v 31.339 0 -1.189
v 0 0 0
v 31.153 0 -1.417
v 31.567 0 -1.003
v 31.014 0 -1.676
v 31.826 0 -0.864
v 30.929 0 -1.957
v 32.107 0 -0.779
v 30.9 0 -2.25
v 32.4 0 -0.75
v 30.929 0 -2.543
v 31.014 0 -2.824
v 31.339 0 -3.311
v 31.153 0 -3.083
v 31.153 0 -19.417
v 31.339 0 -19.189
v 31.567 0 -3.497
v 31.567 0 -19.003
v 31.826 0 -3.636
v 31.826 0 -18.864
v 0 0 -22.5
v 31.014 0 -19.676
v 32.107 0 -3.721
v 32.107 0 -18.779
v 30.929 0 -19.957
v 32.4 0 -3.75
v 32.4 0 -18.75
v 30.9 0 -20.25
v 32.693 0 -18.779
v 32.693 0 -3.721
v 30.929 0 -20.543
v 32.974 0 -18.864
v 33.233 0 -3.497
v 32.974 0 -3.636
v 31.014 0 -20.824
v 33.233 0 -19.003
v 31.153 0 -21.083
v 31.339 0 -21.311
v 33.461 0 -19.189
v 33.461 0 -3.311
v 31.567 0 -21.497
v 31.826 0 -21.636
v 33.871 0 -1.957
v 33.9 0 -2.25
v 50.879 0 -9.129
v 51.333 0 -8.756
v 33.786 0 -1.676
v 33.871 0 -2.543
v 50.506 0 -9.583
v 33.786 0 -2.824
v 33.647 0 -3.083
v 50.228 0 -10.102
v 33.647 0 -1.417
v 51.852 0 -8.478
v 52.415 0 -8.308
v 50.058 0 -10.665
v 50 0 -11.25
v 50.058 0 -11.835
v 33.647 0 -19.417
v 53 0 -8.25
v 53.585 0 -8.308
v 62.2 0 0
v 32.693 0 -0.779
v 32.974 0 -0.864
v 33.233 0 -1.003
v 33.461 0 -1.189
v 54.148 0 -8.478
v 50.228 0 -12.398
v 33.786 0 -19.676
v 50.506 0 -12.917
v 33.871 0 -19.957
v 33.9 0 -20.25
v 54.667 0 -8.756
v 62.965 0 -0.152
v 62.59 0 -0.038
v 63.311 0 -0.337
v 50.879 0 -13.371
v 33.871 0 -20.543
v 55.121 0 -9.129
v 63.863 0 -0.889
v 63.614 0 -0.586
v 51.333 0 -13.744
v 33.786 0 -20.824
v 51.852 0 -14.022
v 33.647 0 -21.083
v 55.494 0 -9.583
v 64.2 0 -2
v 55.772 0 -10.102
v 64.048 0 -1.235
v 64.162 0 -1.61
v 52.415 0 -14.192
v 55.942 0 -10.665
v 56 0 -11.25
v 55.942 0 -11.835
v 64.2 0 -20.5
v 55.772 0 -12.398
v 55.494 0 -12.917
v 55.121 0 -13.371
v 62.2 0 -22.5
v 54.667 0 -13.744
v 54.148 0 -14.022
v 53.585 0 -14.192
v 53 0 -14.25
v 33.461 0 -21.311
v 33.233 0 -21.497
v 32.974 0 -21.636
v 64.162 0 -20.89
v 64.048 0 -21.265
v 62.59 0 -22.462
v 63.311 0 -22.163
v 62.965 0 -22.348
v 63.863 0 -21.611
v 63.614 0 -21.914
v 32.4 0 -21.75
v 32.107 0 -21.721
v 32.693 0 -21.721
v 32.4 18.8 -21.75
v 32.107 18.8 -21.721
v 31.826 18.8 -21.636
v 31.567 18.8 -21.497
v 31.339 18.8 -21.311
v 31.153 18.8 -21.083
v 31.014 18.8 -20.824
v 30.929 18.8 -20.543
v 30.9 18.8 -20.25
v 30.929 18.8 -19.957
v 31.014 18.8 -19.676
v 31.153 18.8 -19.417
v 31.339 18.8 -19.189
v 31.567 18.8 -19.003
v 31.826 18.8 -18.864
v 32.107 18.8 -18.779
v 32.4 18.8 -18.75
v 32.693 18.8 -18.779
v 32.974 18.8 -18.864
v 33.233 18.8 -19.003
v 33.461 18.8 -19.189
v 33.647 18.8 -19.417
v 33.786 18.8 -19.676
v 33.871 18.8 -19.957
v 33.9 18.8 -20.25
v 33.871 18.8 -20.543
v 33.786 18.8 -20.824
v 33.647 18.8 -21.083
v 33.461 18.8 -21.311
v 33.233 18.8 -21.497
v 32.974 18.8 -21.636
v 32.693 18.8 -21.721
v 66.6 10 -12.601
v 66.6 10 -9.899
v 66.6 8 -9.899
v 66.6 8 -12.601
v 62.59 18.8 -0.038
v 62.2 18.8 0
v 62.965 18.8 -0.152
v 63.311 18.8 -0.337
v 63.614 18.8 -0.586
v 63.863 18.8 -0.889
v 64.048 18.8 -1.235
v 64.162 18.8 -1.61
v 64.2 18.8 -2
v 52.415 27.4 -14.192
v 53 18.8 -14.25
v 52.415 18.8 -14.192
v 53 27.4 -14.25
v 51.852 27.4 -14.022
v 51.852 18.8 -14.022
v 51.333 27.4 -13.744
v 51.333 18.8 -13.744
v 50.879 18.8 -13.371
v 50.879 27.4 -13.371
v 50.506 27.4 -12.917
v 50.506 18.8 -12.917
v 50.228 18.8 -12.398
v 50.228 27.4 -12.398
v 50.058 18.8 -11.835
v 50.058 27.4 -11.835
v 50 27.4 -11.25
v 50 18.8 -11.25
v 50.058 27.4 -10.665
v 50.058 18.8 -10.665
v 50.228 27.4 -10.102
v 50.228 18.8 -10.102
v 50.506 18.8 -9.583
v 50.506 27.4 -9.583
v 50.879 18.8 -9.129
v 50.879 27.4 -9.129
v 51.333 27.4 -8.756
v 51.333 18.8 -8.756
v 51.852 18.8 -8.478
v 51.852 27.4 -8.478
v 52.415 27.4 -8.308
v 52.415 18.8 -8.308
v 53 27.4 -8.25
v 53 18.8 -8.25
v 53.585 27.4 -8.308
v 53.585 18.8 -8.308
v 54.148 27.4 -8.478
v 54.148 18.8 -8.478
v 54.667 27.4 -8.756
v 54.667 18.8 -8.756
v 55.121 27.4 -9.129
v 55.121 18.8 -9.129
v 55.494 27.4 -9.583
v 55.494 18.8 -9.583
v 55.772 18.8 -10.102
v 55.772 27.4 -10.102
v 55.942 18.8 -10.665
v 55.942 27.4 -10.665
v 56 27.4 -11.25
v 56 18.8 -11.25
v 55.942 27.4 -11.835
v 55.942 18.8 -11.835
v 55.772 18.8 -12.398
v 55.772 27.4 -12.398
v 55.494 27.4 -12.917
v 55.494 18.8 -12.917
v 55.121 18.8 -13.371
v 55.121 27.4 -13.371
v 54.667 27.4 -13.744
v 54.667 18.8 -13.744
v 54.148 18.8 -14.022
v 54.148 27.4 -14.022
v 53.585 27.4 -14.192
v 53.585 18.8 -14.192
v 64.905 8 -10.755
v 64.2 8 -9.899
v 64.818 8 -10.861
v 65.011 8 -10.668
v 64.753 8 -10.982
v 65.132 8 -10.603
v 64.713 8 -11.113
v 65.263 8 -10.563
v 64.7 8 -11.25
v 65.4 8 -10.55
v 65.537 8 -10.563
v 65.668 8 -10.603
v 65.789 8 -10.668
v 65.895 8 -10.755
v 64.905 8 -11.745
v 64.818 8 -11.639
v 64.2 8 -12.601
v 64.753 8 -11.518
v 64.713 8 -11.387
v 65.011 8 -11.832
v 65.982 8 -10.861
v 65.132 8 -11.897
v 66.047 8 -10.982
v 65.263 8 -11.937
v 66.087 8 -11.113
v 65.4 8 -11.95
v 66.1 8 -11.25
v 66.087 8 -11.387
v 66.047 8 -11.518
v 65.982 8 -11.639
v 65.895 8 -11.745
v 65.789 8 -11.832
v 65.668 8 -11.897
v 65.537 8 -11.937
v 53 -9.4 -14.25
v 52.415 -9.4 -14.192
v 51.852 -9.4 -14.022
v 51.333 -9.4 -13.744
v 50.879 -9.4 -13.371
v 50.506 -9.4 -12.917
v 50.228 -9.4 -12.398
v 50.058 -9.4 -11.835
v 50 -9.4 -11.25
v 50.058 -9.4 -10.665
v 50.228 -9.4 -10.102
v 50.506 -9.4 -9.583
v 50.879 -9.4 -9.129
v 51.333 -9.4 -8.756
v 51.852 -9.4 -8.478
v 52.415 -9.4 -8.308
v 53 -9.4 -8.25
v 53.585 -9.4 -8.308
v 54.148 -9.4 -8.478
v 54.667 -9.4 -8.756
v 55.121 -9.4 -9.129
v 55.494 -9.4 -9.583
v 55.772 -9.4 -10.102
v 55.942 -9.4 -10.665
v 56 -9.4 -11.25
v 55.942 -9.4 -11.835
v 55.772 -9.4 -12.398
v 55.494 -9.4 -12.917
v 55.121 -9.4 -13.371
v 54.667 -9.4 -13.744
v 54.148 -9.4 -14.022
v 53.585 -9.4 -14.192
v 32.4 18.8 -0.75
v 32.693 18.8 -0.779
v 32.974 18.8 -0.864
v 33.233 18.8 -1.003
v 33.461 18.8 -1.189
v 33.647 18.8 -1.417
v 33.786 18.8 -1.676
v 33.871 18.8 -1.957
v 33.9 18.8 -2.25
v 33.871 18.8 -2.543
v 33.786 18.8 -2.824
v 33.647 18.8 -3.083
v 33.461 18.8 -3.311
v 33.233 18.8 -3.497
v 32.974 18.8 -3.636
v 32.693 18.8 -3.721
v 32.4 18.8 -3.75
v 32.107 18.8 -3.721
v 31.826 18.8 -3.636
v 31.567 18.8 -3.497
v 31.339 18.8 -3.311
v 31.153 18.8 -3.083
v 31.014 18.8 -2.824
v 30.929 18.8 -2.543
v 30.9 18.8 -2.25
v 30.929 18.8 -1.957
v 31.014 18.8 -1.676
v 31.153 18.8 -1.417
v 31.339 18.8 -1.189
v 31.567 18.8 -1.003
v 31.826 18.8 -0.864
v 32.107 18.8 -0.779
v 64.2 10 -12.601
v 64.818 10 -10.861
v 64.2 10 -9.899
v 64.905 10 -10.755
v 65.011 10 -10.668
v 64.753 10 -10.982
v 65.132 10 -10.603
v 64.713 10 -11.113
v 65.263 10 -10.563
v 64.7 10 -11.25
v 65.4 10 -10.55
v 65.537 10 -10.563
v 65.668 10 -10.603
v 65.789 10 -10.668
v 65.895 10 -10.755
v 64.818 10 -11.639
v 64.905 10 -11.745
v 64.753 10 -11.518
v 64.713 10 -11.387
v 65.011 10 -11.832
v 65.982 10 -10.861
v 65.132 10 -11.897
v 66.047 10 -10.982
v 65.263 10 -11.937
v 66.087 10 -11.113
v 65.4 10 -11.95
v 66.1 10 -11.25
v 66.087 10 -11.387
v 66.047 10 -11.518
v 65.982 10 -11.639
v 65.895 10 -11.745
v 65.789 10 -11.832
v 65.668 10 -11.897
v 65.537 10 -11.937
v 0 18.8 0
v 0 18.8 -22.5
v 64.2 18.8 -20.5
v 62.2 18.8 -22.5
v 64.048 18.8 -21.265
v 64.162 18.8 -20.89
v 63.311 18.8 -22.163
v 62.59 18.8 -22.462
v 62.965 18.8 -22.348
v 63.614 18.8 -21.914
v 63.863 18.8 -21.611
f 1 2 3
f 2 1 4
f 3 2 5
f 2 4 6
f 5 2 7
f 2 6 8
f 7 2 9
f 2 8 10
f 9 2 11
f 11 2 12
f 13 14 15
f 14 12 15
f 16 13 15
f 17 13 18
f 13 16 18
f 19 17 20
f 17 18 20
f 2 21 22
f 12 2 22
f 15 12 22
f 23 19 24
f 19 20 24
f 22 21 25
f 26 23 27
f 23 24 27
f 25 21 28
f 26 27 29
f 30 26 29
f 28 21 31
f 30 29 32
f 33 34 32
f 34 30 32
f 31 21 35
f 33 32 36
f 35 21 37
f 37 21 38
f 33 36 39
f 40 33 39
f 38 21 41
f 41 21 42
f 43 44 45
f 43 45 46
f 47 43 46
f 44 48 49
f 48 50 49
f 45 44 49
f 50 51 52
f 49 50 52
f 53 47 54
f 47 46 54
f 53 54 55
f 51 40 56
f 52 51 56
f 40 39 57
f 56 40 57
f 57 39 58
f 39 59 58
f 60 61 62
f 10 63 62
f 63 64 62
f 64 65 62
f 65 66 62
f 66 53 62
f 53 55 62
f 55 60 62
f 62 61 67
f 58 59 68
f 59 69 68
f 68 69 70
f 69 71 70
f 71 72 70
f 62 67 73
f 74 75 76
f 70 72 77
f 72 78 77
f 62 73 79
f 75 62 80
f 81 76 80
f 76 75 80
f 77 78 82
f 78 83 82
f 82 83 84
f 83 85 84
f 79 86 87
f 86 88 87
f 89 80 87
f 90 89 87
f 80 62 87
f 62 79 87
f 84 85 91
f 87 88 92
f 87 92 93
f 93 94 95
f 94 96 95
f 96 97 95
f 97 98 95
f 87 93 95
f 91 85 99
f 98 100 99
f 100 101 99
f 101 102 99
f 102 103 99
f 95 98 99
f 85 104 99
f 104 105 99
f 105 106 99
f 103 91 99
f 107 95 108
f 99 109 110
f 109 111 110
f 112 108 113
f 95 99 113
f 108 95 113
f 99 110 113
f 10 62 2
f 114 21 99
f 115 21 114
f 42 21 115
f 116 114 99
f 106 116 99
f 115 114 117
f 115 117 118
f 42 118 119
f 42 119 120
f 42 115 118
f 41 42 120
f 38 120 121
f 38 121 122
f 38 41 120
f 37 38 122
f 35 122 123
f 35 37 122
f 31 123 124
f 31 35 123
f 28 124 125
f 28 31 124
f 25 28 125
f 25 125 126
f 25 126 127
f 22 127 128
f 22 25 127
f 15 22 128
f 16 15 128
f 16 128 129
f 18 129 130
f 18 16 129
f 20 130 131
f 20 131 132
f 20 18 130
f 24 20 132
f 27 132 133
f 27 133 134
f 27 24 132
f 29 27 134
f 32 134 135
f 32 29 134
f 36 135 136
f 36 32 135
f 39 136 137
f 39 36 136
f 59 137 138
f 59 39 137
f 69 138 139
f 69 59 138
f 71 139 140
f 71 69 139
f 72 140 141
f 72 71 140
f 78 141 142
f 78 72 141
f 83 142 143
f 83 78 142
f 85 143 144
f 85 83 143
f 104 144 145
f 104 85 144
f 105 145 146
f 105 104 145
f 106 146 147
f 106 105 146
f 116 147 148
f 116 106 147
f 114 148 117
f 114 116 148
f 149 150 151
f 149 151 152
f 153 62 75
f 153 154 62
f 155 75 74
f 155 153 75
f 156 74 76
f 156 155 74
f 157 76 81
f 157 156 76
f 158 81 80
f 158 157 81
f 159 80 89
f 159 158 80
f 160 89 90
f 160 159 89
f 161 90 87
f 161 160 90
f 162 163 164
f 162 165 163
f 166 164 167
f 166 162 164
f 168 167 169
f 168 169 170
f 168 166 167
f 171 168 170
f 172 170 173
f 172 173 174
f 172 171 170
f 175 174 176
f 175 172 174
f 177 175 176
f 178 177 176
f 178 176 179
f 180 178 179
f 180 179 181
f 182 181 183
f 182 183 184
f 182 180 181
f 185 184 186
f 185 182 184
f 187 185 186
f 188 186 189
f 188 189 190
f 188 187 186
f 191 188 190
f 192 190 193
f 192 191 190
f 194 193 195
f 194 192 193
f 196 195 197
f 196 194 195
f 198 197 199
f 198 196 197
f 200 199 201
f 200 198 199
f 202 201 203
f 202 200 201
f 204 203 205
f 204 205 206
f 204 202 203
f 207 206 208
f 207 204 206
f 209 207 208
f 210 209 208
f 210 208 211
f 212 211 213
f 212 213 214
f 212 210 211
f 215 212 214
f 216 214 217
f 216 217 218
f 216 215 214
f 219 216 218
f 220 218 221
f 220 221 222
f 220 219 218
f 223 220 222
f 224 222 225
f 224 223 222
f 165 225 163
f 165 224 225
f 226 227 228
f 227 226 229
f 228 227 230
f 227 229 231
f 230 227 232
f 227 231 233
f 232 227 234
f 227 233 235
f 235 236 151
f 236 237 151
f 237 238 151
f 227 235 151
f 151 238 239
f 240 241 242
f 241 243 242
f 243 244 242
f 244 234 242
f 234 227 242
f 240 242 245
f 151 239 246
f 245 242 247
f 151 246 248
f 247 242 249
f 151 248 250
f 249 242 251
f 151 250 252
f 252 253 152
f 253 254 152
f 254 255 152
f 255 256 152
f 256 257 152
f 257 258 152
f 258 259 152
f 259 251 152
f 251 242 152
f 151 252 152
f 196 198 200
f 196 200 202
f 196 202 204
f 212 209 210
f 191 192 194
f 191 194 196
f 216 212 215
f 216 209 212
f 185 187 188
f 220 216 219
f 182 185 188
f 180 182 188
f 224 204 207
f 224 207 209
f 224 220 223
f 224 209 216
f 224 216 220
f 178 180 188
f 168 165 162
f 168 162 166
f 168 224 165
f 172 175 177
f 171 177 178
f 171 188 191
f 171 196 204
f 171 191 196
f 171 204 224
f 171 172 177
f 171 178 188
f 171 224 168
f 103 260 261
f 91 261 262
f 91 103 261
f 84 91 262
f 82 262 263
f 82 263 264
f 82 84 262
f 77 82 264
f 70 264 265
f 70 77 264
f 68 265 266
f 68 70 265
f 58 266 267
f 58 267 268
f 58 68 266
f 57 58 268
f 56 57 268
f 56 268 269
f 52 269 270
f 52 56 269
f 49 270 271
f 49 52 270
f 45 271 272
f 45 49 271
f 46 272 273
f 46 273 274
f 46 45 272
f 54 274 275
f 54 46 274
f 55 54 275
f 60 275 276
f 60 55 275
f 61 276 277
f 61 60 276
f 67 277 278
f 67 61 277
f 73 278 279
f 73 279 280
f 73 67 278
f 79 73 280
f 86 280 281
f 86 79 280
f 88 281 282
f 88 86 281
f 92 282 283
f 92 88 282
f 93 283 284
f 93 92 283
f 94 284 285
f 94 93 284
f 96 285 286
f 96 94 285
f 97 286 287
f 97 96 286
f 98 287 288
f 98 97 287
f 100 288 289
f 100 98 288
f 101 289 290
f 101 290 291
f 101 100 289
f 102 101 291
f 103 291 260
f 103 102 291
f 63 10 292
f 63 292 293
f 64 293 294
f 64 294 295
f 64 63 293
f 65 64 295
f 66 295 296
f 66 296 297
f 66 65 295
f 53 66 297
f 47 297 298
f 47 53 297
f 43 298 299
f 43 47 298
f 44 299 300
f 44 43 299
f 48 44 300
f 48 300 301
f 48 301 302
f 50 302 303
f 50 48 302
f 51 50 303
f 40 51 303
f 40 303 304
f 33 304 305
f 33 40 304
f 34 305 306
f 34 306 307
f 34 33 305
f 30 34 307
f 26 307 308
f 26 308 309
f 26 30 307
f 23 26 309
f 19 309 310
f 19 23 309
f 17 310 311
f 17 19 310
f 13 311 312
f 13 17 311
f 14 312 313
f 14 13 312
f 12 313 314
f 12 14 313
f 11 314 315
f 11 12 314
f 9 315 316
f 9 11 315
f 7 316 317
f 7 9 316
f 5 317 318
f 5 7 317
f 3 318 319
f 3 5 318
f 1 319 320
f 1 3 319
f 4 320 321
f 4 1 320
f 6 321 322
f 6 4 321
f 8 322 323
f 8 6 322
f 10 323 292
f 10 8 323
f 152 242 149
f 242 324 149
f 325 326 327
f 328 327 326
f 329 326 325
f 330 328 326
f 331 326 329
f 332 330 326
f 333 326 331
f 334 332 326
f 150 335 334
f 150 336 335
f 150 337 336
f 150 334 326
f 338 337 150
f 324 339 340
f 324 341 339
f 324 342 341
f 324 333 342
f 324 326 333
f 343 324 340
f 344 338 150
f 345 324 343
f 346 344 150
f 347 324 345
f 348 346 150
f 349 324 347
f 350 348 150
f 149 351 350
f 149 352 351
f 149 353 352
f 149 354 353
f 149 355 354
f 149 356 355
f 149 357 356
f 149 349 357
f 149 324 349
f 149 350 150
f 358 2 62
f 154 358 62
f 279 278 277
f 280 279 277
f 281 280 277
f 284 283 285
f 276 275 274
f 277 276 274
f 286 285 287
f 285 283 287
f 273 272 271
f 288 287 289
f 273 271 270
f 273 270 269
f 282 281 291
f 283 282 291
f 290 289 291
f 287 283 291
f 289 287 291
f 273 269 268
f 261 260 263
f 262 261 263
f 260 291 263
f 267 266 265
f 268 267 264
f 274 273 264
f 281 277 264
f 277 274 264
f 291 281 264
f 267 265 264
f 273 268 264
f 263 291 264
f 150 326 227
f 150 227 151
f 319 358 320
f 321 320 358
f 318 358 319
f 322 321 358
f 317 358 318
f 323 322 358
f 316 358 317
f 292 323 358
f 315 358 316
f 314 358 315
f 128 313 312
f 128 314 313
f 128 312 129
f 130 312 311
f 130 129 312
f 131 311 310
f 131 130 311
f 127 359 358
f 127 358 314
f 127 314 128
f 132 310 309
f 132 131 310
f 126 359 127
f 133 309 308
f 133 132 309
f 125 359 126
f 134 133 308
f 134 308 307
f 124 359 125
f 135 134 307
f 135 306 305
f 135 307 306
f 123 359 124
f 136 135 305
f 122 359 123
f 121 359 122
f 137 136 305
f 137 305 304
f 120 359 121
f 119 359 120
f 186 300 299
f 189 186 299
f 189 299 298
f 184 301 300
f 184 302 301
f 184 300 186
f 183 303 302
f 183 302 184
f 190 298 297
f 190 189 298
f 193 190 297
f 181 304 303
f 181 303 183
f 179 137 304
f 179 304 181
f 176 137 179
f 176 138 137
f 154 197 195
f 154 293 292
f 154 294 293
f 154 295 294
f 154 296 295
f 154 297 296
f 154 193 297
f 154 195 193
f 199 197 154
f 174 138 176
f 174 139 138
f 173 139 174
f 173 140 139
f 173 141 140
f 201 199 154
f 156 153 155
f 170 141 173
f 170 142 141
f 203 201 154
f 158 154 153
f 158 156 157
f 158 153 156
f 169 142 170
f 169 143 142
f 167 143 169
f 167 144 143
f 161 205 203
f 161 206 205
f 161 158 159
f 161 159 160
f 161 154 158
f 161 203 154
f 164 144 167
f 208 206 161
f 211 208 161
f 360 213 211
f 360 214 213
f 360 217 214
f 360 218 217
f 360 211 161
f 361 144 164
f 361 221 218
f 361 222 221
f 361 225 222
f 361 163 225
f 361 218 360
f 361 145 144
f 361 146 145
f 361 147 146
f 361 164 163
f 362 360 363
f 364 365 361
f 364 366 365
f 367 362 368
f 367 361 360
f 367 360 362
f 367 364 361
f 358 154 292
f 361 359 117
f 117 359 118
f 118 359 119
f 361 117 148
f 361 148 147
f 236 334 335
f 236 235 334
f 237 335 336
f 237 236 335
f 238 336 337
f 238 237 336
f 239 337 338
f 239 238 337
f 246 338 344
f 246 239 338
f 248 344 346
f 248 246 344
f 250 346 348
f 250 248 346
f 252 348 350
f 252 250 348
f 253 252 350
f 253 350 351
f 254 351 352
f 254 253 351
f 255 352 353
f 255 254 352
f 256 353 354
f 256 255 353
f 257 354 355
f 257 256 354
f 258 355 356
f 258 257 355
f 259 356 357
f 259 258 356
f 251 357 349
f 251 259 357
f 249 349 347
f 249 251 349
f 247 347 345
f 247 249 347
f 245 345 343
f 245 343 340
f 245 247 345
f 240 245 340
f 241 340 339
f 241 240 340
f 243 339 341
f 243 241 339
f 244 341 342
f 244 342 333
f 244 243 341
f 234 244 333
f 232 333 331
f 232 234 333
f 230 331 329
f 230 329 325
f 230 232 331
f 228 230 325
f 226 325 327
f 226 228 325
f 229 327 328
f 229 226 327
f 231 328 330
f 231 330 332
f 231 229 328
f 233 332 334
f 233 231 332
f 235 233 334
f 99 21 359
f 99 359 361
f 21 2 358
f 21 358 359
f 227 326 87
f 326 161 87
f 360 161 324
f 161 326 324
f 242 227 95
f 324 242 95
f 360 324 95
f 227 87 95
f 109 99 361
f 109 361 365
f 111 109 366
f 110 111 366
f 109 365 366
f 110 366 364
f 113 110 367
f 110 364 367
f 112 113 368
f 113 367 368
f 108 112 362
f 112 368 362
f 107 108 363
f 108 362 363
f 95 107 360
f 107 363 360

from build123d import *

# Parameters (mm, degrees)
SKETCH1_W           = 64.2
SKETCH1_H           = 22.5
SKETCH1_R           = 1.5
BOSS_EXTRUDE1_DEPTH = 18.8
SKETCH2_R           = 3
BOSS_EXTRUDE2_DEPTH = 18.4
SKETCH3_W           = 2.4
SKETCH3_H           = 2.701398926
SKETCH3_R           = 0.7
BOSS_EXTRUDE3_DEPTH = 1
FILLET1_R           = 2


with BuildPart() as part:
    # Sketch1 → Boss-Extrude1 (new body)
    with BuildSketch(Plane(origin=(0, 0, 0), x_dir=(1, 0, 0), z_dir=(0, 1, 0))):
        with Locations((32.1, 11.25)):
            Rectangle(SKETCH1_W, SKETCH1_H)
        with Locations(Location((32.4, 2.25, 0), (0, 0, 270))):
            Circle(SKETCH1_R, mode=Mode.SUBTRACT)
        with Locations(Location((32.4, 20.25, 0), (0, 0, 90))):
            Circle(SKETCH1_R, mode=Mode.SUBTRACT)
    extrude(amount=BOSS_EXTRUDE1_DEPTH)

    # Sketch2 → Boss-Extrude2 (add, symmetric)
    with BuildSketch(Plane(origin=(0, 9, 0), x_dir=(1, 0, 0), z_dir=(0, 1, 0))):
        with Locations(Location((53, 11.25, 0), (0, 0, 90))):
            Circle(SKETCH2_R)
    extrude(amount=BOSS_EXTRUDE2_DEPTH, both=True)

    # Sketch3 → Boss-Extrude3 (add, symmetric)
    with BuildSketch(Plane(origin=(0, 9, 0), x_dir=(1, 0, 0), z_dir=(0, 1, 0))):
        with Locations((65.4, 11.25)):
            Rectangle(SKETCH3_W, SKETCH3_H)
        with Locations(Location((65.4, 11.25, 0), (0, 0, 270))):
            Circle(SKETCH3_R, mode=Mode.SUBTRACT)
    extrude(amount=BOSS_EXTRUDE3_DEPTH, both=True)

    # Fillet1
    fillet1_edges = [part.edges().sort_by_distance(p)[0] for p in [
        (64.2, 9.4, -22.5),
        (64.2, 9.4, 0),
    ]]
    fillet(fillet1_edges, radius=FILLET1_R)


solid = part.part
